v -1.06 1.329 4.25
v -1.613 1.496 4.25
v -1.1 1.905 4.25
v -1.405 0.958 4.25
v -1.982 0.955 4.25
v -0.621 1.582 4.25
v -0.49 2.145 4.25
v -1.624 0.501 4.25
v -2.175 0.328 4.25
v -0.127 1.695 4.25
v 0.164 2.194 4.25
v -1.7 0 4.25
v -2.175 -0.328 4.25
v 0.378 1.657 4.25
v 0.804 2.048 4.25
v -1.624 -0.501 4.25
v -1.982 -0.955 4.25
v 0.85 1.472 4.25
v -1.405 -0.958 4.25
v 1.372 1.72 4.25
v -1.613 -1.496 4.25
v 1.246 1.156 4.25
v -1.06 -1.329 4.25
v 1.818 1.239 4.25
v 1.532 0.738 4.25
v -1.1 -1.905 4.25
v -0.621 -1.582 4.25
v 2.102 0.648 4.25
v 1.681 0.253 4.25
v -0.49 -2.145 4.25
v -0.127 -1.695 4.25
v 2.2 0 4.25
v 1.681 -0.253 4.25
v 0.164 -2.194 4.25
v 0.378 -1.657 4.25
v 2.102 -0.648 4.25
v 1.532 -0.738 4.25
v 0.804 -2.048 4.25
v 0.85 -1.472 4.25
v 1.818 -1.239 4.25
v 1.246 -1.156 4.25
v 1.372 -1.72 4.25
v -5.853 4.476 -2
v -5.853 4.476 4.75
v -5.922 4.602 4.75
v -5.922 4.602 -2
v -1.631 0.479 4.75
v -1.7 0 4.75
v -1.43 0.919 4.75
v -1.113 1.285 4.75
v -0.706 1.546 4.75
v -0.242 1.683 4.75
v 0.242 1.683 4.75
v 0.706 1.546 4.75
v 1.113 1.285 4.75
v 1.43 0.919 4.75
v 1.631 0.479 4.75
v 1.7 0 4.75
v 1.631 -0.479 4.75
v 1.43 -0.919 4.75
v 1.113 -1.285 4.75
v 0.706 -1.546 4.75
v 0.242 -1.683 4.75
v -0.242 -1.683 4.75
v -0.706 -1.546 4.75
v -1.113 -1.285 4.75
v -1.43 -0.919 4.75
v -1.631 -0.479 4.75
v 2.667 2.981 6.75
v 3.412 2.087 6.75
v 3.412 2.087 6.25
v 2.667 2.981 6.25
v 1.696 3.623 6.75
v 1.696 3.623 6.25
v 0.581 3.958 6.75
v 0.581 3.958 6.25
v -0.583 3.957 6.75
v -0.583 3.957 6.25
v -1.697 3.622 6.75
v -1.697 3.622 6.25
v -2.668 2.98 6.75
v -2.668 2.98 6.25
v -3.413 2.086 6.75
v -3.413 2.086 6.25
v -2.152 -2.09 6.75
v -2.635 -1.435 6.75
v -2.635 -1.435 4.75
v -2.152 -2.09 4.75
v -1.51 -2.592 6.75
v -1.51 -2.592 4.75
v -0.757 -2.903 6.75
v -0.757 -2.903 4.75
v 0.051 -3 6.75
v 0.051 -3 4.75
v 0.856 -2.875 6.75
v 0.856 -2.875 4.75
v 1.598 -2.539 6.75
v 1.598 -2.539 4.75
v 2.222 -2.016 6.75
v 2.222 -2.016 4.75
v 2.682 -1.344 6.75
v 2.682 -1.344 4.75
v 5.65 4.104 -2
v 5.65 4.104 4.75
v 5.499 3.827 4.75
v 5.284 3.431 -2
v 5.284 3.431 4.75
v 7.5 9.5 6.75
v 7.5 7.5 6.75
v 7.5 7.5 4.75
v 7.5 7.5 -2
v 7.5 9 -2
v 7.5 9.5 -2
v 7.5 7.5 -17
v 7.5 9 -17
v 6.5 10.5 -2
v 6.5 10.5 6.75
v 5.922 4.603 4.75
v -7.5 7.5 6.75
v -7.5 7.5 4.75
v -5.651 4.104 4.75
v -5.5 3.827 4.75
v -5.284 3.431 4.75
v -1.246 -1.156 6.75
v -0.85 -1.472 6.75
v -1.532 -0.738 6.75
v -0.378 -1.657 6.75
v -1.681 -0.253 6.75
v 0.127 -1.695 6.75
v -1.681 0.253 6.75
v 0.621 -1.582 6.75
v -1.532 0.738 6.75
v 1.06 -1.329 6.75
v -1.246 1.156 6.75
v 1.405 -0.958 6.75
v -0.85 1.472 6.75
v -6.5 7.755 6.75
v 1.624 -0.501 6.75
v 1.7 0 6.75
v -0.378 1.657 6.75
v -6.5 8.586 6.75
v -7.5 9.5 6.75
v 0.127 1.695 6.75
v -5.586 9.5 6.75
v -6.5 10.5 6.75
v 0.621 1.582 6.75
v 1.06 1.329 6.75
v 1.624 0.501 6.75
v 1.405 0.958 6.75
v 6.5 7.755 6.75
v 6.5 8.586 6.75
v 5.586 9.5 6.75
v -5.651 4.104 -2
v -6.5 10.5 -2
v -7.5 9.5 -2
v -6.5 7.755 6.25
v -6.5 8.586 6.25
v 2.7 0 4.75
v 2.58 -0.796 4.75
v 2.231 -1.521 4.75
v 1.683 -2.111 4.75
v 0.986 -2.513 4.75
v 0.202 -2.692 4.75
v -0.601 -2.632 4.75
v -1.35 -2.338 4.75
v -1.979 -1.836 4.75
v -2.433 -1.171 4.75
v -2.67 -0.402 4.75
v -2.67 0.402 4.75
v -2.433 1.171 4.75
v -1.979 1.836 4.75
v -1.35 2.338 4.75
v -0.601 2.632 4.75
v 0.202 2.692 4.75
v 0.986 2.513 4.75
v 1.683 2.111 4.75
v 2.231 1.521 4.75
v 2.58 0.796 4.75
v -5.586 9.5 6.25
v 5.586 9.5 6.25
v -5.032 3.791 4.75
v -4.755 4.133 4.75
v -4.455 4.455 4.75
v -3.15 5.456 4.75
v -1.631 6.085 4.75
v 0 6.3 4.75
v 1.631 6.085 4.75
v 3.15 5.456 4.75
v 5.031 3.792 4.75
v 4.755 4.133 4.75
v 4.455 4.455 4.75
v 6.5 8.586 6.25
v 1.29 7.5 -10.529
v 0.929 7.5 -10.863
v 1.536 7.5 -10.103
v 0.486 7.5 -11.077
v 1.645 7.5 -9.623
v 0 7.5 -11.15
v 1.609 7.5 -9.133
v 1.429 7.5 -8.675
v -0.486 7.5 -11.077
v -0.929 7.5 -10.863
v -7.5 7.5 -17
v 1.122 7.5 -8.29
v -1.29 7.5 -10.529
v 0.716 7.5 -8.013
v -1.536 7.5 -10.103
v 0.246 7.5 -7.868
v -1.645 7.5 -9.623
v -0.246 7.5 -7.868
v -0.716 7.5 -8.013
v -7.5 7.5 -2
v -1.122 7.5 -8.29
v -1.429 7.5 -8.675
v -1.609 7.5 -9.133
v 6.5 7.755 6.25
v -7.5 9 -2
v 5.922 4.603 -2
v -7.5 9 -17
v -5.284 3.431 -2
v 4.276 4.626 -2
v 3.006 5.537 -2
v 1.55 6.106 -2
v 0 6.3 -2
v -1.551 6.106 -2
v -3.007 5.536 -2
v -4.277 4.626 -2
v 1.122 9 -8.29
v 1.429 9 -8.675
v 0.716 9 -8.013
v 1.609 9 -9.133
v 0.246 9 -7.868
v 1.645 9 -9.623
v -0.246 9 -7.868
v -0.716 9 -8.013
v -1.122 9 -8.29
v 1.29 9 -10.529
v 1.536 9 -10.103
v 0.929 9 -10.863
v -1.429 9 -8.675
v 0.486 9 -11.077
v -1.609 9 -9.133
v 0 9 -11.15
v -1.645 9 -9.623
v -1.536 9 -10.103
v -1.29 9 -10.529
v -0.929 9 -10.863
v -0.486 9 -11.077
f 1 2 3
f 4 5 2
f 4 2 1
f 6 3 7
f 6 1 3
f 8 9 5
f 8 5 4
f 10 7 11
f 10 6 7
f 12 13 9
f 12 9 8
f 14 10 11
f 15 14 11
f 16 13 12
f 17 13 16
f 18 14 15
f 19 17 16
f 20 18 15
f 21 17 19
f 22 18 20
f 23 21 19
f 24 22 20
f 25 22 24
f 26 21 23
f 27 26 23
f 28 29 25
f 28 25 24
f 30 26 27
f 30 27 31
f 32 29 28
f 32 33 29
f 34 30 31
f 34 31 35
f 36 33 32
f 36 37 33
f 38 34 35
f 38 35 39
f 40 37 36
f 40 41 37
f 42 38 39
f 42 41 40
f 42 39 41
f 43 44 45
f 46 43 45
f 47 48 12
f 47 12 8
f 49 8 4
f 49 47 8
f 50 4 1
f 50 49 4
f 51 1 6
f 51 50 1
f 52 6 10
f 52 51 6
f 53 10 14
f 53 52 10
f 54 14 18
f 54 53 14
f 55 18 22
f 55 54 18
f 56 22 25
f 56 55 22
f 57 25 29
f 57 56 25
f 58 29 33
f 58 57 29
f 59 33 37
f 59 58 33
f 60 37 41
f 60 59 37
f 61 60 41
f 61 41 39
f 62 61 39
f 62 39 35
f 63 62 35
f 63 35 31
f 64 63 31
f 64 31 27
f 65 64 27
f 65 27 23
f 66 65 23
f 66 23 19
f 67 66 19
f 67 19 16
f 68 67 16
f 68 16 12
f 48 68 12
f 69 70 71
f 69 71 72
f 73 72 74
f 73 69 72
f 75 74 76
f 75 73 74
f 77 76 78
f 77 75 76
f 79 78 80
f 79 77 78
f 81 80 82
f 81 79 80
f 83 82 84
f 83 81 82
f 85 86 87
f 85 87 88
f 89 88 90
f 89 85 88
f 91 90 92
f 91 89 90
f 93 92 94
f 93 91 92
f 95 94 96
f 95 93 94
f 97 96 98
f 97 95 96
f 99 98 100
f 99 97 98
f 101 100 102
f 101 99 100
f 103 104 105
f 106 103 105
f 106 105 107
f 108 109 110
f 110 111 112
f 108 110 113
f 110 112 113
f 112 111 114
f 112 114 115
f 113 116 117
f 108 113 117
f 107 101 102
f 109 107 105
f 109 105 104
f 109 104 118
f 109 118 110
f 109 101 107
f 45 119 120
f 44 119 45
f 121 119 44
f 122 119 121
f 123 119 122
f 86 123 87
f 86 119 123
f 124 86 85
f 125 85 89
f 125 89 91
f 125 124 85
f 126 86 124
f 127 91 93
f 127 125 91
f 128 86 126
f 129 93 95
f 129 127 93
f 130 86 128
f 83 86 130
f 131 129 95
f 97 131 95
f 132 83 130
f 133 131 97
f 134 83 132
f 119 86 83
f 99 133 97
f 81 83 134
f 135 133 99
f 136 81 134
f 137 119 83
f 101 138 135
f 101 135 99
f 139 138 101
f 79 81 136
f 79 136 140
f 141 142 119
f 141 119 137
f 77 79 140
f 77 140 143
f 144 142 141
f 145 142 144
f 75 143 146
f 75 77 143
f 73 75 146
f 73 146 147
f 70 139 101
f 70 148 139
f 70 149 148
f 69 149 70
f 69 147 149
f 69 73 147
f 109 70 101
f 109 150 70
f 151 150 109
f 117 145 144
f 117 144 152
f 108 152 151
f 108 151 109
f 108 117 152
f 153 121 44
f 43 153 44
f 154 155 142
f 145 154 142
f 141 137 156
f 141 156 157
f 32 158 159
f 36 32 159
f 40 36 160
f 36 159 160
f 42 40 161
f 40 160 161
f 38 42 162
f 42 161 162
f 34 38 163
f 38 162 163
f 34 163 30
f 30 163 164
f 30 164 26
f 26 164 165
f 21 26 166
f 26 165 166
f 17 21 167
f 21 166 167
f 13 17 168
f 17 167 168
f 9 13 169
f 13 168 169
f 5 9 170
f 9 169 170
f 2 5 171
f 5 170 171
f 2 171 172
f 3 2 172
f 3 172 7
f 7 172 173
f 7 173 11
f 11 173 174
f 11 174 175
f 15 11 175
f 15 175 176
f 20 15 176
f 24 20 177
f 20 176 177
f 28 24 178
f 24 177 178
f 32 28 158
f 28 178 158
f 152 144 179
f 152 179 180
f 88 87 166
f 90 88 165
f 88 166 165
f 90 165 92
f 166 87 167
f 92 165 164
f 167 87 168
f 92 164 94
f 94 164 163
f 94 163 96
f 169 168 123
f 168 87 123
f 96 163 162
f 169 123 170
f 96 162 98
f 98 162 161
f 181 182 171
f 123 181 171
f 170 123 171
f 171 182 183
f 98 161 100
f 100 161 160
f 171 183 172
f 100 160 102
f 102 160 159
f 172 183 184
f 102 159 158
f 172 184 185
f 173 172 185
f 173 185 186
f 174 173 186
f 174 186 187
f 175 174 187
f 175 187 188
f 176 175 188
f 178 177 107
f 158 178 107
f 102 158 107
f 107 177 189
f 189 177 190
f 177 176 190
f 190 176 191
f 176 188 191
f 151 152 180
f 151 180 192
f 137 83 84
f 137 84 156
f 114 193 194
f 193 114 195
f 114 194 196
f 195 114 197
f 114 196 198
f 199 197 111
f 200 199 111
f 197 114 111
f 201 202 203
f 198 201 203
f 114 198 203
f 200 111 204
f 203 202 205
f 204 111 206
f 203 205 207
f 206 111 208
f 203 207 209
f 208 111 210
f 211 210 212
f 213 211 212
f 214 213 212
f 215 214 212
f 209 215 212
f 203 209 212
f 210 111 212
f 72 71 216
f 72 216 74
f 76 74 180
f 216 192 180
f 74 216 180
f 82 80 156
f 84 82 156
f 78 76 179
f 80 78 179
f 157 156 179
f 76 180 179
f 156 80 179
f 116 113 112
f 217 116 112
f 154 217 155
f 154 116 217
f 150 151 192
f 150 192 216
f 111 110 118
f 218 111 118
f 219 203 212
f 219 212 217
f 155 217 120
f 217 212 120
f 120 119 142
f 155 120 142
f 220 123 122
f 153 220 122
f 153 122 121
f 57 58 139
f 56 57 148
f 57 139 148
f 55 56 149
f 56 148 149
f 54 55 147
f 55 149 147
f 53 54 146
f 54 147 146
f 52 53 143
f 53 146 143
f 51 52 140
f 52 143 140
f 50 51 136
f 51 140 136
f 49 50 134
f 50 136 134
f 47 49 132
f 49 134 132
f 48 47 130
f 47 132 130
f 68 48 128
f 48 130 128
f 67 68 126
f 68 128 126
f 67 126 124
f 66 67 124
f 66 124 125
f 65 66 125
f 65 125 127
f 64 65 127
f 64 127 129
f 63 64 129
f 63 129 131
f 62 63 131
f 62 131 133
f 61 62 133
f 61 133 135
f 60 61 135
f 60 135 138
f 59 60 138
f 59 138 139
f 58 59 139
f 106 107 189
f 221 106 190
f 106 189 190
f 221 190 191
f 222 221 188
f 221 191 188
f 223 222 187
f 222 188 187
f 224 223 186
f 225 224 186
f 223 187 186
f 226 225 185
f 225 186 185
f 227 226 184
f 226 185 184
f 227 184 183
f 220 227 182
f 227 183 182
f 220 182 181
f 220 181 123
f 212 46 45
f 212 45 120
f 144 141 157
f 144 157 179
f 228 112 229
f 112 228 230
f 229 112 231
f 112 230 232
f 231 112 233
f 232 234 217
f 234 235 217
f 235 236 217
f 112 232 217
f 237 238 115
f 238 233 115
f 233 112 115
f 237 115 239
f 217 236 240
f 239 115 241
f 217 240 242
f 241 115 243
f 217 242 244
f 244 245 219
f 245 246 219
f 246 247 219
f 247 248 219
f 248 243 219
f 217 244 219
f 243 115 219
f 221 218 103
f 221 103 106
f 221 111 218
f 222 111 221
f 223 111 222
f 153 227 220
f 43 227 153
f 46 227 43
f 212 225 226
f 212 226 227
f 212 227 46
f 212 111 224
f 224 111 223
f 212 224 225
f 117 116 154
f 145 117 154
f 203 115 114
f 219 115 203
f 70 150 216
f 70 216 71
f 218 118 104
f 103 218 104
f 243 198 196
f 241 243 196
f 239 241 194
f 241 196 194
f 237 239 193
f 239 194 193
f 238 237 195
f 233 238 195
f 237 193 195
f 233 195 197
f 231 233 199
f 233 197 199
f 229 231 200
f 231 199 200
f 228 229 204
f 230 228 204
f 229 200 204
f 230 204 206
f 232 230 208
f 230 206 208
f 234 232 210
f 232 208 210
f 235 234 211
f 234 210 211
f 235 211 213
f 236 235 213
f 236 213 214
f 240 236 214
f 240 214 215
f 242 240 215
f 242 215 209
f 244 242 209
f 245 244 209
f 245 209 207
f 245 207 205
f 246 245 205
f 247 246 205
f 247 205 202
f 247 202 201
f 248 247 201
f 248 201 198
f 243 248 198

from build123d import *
from build123d.topology import SkipClean

# Parameters (mm, degrees)
BOSS_EXTRUDE1_DEPTH  = 2
BOSS_EXTRUDE2_START  = 4.75
BOSS_EXTRUDE2_DEPTH  = 4.75
BOSS_EXTRUDE3_START  = 2
SKETCH3_R            = 1.7
BOSS_EXTRUDE3_DEPTH  = 2
SKETCH4_R            = 2.2
SKETCH4_R_2          = 1.7
BOSS_EXTRUDE4_DEPTH  = 0.5
CHAMFER1_SIZE        = 0.5
SKETCH5_W            = 7.5
SKETCH5_H            = 3
BOSS_EXTRUDE5_DEPTH  = 2
BOSS_EXTRUDE6_DEPTH  = 6.75
BOSS_EXTRUDE8_DEPTH  = 6.75
SKETCH10_W           = 15
SKETCH10_H           = 3
BOSS_EXTRUDE9_DEPTH  = 15
SKETCH11_R           = 1.65
CUT_EXTRUDE1_DEPTH   = 22.34244597
FILLET1_START        = -3
FILLET1_DEPTH        = 7.75
CHAMFER6_SIZE        = 1.5
BOSS_EXTRUDE11_START = -6.75
BOSS_EXTRUDE11_DEPTH = 6.75
BOSS_EXTRUDE12_REACH = 29.029
SKETCH16_W           = 15
SKETCH16_H           = 1.5
CUT_EXTRUDE3_DEPTH   = 0.5
SKETCH17_W           = 15
SKETCH17_H           = 1.5
CUT_EXTRUDE4_DEPTH   = 15
CHAMFER8_SIZE        = 1


with BuildPart() as part:
    # Sketch1 → Boss-Extrude1 (new body)
    with BuildSketch(Plane.XY):
        with BuildLine():
            Line((4.594082841, 4.876925553), (5.159993549, 5.442836262))
            ThreePointArc((5.159993549, 5.442836262), (0, 7.5), (-5.159993549, 5.442836262))
            Line((-5.159993549, 5.442836262), (-4.594082841, 4.876925553))
            ThreePointArc((-4.594082841, 4.876925553), (0, 6.7), (4.594082841, 4.876925553))
        make_face()
    extrude(amount=-BOSS_EXTRUDE1_DEPTH)

    # Sketch1<3> → Boss-Extrude2 (add)
    with BuildSketch(Plane.XY.offset(BOSS_EXTRUDE2_START)):
        with BuildLine():
            Line((4.594082841, 4.876925553), (5.159993549, 5.442836262))
            ThreePointArc((5.159993549, 5.442836262), (0, 7.5), (-5.159993549, 5.442836262))
            Line((-5.159993549, 5.442836262), (-4.594082841, 4.876925553))
            ThreePointArc((-4.594082841, 4.876925553), (0, 6.7), (4.594082841, 4.876925553))
        make_face()
        with BuildLine():
            Line((4.454772721, 4.454772721), (4.596194078, 4.596194078))
            Line((4.596194078, 4.596194078), (5.303300859, 5.303300859))
            ThreePointArc((5.303300859, 5.303300859), (5.232112384, 5.373546315), (5.159993549, 5.442836262))
            Line((5.159993549, 5.442836262), (4.594082841, 4.876925553))
            ThreePointArc((4.594082841, 4.876925553), (0, 6.7), (-4.594082841, 4.876925553))
            Line((-4.594082841, 4.876925553), (-5.159993549, 5.442836262))
            ThreePointArc((-5.159993549, 5.442836262), (-5.232112384, 5.373546315), (-5.303300859, 5.303300859))
            Line((-5.303300859, 5.303300859), (-4.596194078, 4.596194078))
            Line((-4.596194078, 4.596194078), (-4.454772721, 4.454772721))
            ThreePointArc((-4.454772721, 4.454772721), (0, 6.3), (4.454772721, 4.454772721))
        make_face()
    extrude(amount=-BOSS_EXTRUDE2_DEPTH)

    # Sketch3 → Boss-Extrude3 (add)
    with BuildSketch(Plane.XY.offset(4.75).offset(BOSS_EXTRUDE3_START)):
        with BuildLine():
            ThreePointArc((5.303300859, 5.303300859), (0, 7.5), (-5.303300859, 5.303300859))
            Line((-5.303300859, 5.303300859), (-2.792750347, -1.095694072))
            ThreePointArc((-2.792750347, -1.095694072), (0, -3), (2.792750347, -1.095694072))
            Line((2.792750347, -1.095694072), (5.303300859, 5.303300859))
        make_face()
        Circle(SKETCH3_R, mode=Mode.SUBTRACT)
    extrude(amount=-BOSS_EXTRUDE3_DEPTH)

    # Sketch4 → Boss-Extrude4 (add)
    with SkipClean():  # the faces are left unmerged after this step: merging them gives an invalid solid
        with BuildSketch(Plane(origin=(0, 0, 4.75), x_dir=(-1, 0, 0), z_dir=(0, 0, -1))):
            with Locations(Location((0, 0, 0), (0, 0, 180))):
                Circle(SKETCH4_R)
            Circle(SKETCH4_R_2, mode=Mode.SUBTRACT)
        extrude(amount=BOSS_EXTRUDE4_DEPTH)
    add(part.part.scale(1), mode=Mode.REPLACE)  # the faces are merged on a copy

    # Chamfer1
    chamfer1_edges = [part.edges().sort_by_distance(p)[0] for p in [
        (-2.2, 0, 4.75),
    ]]
    chamfer(chamfer1_edges, length=CHAMFER1_SIZE - 0.0001)  # a hair under: the kernel refuses the full size

    # Sketch5 → Boss-Extrude5 (add)
    with BuildSketch(Plane.XY.offset(6.75)):
        with BuildLine():
            ThreePointArc((-5.303300859, 5.303300859), (-2.870125743, 6.929096494), (0, 7.5))
            Line((0, 7.5), (-7.5, 7.5))
            Line((-7.5, 7.5), (-2.634698995, -1.434698995))
            ThreePointArc((-2.634698995, -1.434698995), (-2.71901318, -1.26766215), (-2.792750347, -1.095694072))
            Line((-2.792750347, -1.095694072), (-5.303300859, 5.303300859))
        make_face()
        with Locations((-3.75, 9)):
            Rectangle(SKETCH5_W, SKETCH5_H)
        with Locations((3.75, 9)):
            Rectangle(SKETCH5_W, SKETCH5_H)
        with BuildLine():
            Line((7.5, 7.5), (0, 7.5))
            ThreePointArc((0, 7.5), (2.870125743, 6.929096494), (5.303300859, 5.303300859))
            Line((5.303300859, 5.303300859), (2.792750347, -1.095694072))
            ThreePointArc((2.792750347, -1.095694072), (2.740333064, -1.220890945), (2.682306676, -1.343588812))
            Line((2.682306676, -1.343588812), (7.5, 7.5))
        make_face()
    extrude(amount=-BOSS_EXTRUDE5_DEPTH)

    # Sketch6 → Boss-Extrude6 (add)
    with BuildSketch(Plane(origin=(0, 0, 4.75), x_dir=(-1, 0, 0), z_dir=(0, 0, -1))):
        with BuildLine():
            Line((-5.921621025, 4.602651891), (-5.499242594, 3.827313795))
            ThreePointArc((-5.499242594, 3.827313795), (-5.138626065, 4.299362995), (-4.737615434, 4.737615434))
            Line((-4.737615434, 4.737615434), (-5.303300859, 5.303300859))
            ThreePointArc((-5.303300859, 5.303300859), (-5.623383774, 4.962615735), (-5.921621025, 4.602651891))
        make_face()
        with BuildLine():
            ThreePointArc((4.737615434, 4.737615434), (5.13888851, 4.2990493), (5.499709828, 3.826642367))
            Line((5.499709828, 3.826642367), (5.922007367, 4.602154794))
            ThreePointArc((5.922007367, 4.602154794), (5.623592059, 4.962379707), (5.303300859, 5.303300859))
            Line((5.303300859, 5.303300859), (4.737615434, 4.737615434))
        make_face()
    extrude(amount=BOSS_EXTRUDE6_DEPTH)

    # Sketch8 → Boss-Extrude8 (add)
    with BuildSketch(Plane(origin=(0, 0, 4.75), x_dir=(-1, 0, 0), z_dir=(0, 0, -1))):
        with BuildLine():
            Line((5.922007367, 4.602154794), (7.5, 7.5))
            Line((7.5, 7.5), (7.5, 10.5))
            Line((7.5, 10.5), (-7.5, 10.5))
            Line((-7.5, 10.5), (-7.5, 7.5))
            Line((-7.5, 7.5), (-5.921621025, 4.602651891))
            ThreePointArc((-5.921621025, 4.602651891), (0.000314788, 7.499999993), (5.922007367, 4.602154794))
        make_face()
    extrude(amount=BOSS_EXTRUDE8_DEPTH)

    # Sketch10 → Boss-Extrude9 (add)
    with BuildSketch(Plane(origin=(0, 0, -2), x_dir=(-1, 0, 0), z_dir=(0, 0, -1))):
        with Locations((0, 9)):
            Rectangle(SKETCH10_W, SKETCH10_H)
    extrude(amount=BOSS_EXTRUDE9_DEPTH)

    # Sketch11 → Cut-Extrude1 (cut, through all)
    with BuildSketch(Plane.XZ.offset(-7.5)):
        with Locations(Location((0, -9.5, 0), (0, 0, 270))):
            Circle(SKETCH11_R)
    extrude(amount=-CUT_EXTRUDE1_DEPTH, mode=Mode.SUBTRACT)

    # Fillet1: read off the stored shape, not the designer's step
    # Fillet1 outline → Fillet1 (cut)
    with BuildSketch(Plane.XY.offset(FILLET1_START)):
        with BuildLine():
            ThreePointArc((-5.316260804, 4.077667356), (-5.490505676, 3.999994233), (-5.650601756, 4.10374217))
            Line((-5.650601756, 4.10374217), (-5.499709828, 3.826642367))
            ThreePointArc((-5.499709828, 3.826642367), (-5.409441613, 3.953219123), (-5.316260804, 4.077667356))
        make_face()
        with BuildLine():
            ThreePointArc((5.650134675, 4.104298532), (5.49004858, 4.000580786), (5.315823507, 4.078237419))
            ThreePointArc((5.315823507, 4.078237419), (5.408988293, 3.953839354), (5.499242594, 3.827313795))
            Line((5.499242594, 3.827313795), (5.650134675, 4.104298532))
        make_face()
    extrude(amount=FILLET1_DEPTH, mode=Mode.SUBTRACT)

    # Chamfer6
    chamfer6_edges = [part.edges().sort_by_distance(p)[0] for p in [
        (7.5, 10.5, -5.125),
        (-7.5, 10.5, -5.125),
    ]]
    chamfer(chamfer6_edges, length=CHAMFER6_SIZE)

    # Sketch12 → Boss-Extrude11 (add)
    with BuildSketch(Plane(origin=(0, 0, -2), x_dir=(-1, 0, 0), z_dir=(0, 0, -1)).offset(BOSS_EXTRUDE11_START)):
        with BuildLine():
            Line((-5.303300859, 5.303300859), (-5.210007514, 5.210007514))
            ThreePointArc((-5.210007514, 5.210007514), (-5.138810365, 5.280244751), (-5.066666421, 5.349509134))
            Line((-5.066666421, 5.349509134), (-5.159993549, 5.442836262))
            ThreePointArc((-5.159993549, 5.442836262), (-5.232112384, 5.373546315), (-5.303300859, 5.303300859))
        make_face()
        with BuildLine():
            ThreePointArc((-5.315823507, 4.078237419), (-5.49004858, 4.000580786), (-5.650134675, 4.104298532))
            Line((-5.650134675, 4.104298532), (-5.283538928, 3.431357806))
            ThreePointArc((-5.283538928, 3.431357806), (0.000460722, 6.299999983), (5.284040746, 3.430584993))
            Line((5.284040746, 3.430584993), (5.650601756, 4.10374217))
            ThreePointArc((5.650601756, 4.10374217), (5.490505675, 3.999994233), (5.316260804, 4.077667356))
            ThreePointArc((5.316260804, 4.077667356), (5.037756417, 4.417126926), (4.737615434, 4.737615434))
            Line((4.737615434, 4.737615434), (5.210007514, 5.210007514))
            ThreePointArc((5.210007514, 5.210007514), (5.138810365, 5.280244751), (5.066666421, 5.349509134))
            Line((5.066666421, 5.349509134), (4.594082841, 4.876925553))
            ThreePointArc((4.594082841, 4.876925553), (0, 6.7), (-4.594082841, 4.876925553))
            Line((-4.594082841, 4.876925553), (-5.066666421, 5.349509134))
            ThreePointArc((-5.066666421, 5.349509134), (-5.138810365, 5.280244751), (-5.210007514, 5.210007514))
            Line((-5.210007514, 5.210007514), (-4.737615434, 4.737615434))
            ThreePointArc((-4.737615434, 4.737615434), (-5.037519576, 4.41739703), (-5.315823507, 4.078237419))
        make_face()
        with BuildLine():
            Line((-5.85264511, 4.476036395), (-5.650134675, 4.104298532))
            ThreePointArc((-5.650134675, 4.104298532), (-5.49004858, 4.000580786), (-5.315823507, 4.078237419))
            ThreePointArc((-5.315823507, 4.078237419), (-5.037519576, 4.41739703), (-4.737615434, 4.737615434))
            Line((-4.737615434, 4.737615434), (-5.210007514, 5.210007514))
            ThreePointArc((-5.210007514, 5.210007514), (-5.543487095, 4.85366948), (-5.85264511, 4.476036395))
        make_face()
        with BuildLine():
            Line((5.159993549, 5.442836262), (5.066666421, 5.349509134))
            ThreePointArc((5.066666421, 5.349509134), (5.138810365, 5.280244751), (5.210007514, 5.210007514))
            Line((5.210007514, 5.210007514), (5.303300859, 5.303300859))
            ThreePointArc((5.303300859, 5.303300859), (5.232112384, 5.373546315), (5.159993549, 5.442836262))
        make_face()
        with BuildLine():
            ThreePointArc((5.316260804, 4.077667356), (5.490505675, 3.999994233), (5.650601756, 4.10374217))
            Line((5.650601756, 4.10374217), (5.853045643, 4.47551263))
            ThreePointArc((5.853045643, 4.47551263), (5.543704265, 4.853421435), (5.210007514, 5.210007514))
            Line((5.210007514, 5.210007514), (4.737615434, 4.737615434))
            ThreePointArc((4.737615434, 4.737615434), (5.037756417, 4.417126926), (5.316260804, 4.077667356))
        make_face()
    extrude(amount=BOSS_EXTRUDE11_DEPTH)

    # Boss-Extrude12: up to this face of the body (flat: up to its plane)
    boss_extrude12_end = Plane(part.part.faces().sort_by_distance((-0.00029363, 5.45528482, 6.75))[0])
    # Sketch16 → Boss-Extrude12 (add, up to the picked face)
    with BuildSketch(Plane(origin=(0, 0, -17), x_dir=(-1, 0, 0), z_dir=(0, 0, -1)), mode=Mode.PRIVATE) as boss_extrude12_sk1:
        with Locations((0, 9.75)):
            Rectangle(SKETCH16_W, SKETCH16_H)
    boss_extrude12_tool1 = split(extrude(boss_extrude12_sk1.sketch, amount=-BOSS_EXTRUDE12_REACH, mode=Mode.PRIVATE), bisect_by=boss_extrude12_end, keep=Keep.BOTH, mode=Mode.PRIVATE)
    add(boss_extrude12_tool1.solids().sort_by(Axis((0, 9.75, -17), (0, 0, 1)))[0])

    # Sketch13 → Cut-Extrude3 (cut)
    with BuildSketch(Plane.XY.offset(6.75)):
        with BuildLine():
            ThreePointArc((3.4124071, 2.086978147), (-0.000677338, 3.999999943), (-3.413113698, 2.085822351))
            Line((-3.413113698, 2.085822351), (-6.5, 7.754618569))
            Line((-6.5, 7.754618569), (-6.5, 8.585786438))
            Line((-6.5, 8.585786438), (-5.585786438, 9.5))
            Line((-5.585786438, 9.5), (5.585786438, 9.5))
            Line((5.585786438, 9.5), (6.5, 8.585786438))
            Line((6.5, 8.585786438), (6.5, 7.754711685))
            Line((6.5, 7.754711685), (3.4124071, 2.086978147))
        make_face()
    extrude(amount=-CUT_EXTRUDE3_DEPTH, mode=Mode.SUBTRACT)

    # Sketch17 → Cut-Extrude4 (cut)
    with BuildSketch(Plane(origin=(0, 0, -17), x_dir=(-1, 0, 0), z_dir=(0, 0, -1))):
        with Locations((0, 9.75)):
            Rectangle(SKETCH17_W, SKETCH17_H)
    extrude(amount=-CUT_EXTRUDE4_DEPTH, mode=Mode.SUBTRACT)

    # Chamfer8
    chamfer8_edges = [part.edges().sort_by_distance(p)[0] for p in [
        (7.5, 10.5, 2.375),
        (-7.5, 10.5, 2.375),
    ]]
    chamfer(chamfer8_edges, length=CHAMFER8_SIZE)


solid = part.part
